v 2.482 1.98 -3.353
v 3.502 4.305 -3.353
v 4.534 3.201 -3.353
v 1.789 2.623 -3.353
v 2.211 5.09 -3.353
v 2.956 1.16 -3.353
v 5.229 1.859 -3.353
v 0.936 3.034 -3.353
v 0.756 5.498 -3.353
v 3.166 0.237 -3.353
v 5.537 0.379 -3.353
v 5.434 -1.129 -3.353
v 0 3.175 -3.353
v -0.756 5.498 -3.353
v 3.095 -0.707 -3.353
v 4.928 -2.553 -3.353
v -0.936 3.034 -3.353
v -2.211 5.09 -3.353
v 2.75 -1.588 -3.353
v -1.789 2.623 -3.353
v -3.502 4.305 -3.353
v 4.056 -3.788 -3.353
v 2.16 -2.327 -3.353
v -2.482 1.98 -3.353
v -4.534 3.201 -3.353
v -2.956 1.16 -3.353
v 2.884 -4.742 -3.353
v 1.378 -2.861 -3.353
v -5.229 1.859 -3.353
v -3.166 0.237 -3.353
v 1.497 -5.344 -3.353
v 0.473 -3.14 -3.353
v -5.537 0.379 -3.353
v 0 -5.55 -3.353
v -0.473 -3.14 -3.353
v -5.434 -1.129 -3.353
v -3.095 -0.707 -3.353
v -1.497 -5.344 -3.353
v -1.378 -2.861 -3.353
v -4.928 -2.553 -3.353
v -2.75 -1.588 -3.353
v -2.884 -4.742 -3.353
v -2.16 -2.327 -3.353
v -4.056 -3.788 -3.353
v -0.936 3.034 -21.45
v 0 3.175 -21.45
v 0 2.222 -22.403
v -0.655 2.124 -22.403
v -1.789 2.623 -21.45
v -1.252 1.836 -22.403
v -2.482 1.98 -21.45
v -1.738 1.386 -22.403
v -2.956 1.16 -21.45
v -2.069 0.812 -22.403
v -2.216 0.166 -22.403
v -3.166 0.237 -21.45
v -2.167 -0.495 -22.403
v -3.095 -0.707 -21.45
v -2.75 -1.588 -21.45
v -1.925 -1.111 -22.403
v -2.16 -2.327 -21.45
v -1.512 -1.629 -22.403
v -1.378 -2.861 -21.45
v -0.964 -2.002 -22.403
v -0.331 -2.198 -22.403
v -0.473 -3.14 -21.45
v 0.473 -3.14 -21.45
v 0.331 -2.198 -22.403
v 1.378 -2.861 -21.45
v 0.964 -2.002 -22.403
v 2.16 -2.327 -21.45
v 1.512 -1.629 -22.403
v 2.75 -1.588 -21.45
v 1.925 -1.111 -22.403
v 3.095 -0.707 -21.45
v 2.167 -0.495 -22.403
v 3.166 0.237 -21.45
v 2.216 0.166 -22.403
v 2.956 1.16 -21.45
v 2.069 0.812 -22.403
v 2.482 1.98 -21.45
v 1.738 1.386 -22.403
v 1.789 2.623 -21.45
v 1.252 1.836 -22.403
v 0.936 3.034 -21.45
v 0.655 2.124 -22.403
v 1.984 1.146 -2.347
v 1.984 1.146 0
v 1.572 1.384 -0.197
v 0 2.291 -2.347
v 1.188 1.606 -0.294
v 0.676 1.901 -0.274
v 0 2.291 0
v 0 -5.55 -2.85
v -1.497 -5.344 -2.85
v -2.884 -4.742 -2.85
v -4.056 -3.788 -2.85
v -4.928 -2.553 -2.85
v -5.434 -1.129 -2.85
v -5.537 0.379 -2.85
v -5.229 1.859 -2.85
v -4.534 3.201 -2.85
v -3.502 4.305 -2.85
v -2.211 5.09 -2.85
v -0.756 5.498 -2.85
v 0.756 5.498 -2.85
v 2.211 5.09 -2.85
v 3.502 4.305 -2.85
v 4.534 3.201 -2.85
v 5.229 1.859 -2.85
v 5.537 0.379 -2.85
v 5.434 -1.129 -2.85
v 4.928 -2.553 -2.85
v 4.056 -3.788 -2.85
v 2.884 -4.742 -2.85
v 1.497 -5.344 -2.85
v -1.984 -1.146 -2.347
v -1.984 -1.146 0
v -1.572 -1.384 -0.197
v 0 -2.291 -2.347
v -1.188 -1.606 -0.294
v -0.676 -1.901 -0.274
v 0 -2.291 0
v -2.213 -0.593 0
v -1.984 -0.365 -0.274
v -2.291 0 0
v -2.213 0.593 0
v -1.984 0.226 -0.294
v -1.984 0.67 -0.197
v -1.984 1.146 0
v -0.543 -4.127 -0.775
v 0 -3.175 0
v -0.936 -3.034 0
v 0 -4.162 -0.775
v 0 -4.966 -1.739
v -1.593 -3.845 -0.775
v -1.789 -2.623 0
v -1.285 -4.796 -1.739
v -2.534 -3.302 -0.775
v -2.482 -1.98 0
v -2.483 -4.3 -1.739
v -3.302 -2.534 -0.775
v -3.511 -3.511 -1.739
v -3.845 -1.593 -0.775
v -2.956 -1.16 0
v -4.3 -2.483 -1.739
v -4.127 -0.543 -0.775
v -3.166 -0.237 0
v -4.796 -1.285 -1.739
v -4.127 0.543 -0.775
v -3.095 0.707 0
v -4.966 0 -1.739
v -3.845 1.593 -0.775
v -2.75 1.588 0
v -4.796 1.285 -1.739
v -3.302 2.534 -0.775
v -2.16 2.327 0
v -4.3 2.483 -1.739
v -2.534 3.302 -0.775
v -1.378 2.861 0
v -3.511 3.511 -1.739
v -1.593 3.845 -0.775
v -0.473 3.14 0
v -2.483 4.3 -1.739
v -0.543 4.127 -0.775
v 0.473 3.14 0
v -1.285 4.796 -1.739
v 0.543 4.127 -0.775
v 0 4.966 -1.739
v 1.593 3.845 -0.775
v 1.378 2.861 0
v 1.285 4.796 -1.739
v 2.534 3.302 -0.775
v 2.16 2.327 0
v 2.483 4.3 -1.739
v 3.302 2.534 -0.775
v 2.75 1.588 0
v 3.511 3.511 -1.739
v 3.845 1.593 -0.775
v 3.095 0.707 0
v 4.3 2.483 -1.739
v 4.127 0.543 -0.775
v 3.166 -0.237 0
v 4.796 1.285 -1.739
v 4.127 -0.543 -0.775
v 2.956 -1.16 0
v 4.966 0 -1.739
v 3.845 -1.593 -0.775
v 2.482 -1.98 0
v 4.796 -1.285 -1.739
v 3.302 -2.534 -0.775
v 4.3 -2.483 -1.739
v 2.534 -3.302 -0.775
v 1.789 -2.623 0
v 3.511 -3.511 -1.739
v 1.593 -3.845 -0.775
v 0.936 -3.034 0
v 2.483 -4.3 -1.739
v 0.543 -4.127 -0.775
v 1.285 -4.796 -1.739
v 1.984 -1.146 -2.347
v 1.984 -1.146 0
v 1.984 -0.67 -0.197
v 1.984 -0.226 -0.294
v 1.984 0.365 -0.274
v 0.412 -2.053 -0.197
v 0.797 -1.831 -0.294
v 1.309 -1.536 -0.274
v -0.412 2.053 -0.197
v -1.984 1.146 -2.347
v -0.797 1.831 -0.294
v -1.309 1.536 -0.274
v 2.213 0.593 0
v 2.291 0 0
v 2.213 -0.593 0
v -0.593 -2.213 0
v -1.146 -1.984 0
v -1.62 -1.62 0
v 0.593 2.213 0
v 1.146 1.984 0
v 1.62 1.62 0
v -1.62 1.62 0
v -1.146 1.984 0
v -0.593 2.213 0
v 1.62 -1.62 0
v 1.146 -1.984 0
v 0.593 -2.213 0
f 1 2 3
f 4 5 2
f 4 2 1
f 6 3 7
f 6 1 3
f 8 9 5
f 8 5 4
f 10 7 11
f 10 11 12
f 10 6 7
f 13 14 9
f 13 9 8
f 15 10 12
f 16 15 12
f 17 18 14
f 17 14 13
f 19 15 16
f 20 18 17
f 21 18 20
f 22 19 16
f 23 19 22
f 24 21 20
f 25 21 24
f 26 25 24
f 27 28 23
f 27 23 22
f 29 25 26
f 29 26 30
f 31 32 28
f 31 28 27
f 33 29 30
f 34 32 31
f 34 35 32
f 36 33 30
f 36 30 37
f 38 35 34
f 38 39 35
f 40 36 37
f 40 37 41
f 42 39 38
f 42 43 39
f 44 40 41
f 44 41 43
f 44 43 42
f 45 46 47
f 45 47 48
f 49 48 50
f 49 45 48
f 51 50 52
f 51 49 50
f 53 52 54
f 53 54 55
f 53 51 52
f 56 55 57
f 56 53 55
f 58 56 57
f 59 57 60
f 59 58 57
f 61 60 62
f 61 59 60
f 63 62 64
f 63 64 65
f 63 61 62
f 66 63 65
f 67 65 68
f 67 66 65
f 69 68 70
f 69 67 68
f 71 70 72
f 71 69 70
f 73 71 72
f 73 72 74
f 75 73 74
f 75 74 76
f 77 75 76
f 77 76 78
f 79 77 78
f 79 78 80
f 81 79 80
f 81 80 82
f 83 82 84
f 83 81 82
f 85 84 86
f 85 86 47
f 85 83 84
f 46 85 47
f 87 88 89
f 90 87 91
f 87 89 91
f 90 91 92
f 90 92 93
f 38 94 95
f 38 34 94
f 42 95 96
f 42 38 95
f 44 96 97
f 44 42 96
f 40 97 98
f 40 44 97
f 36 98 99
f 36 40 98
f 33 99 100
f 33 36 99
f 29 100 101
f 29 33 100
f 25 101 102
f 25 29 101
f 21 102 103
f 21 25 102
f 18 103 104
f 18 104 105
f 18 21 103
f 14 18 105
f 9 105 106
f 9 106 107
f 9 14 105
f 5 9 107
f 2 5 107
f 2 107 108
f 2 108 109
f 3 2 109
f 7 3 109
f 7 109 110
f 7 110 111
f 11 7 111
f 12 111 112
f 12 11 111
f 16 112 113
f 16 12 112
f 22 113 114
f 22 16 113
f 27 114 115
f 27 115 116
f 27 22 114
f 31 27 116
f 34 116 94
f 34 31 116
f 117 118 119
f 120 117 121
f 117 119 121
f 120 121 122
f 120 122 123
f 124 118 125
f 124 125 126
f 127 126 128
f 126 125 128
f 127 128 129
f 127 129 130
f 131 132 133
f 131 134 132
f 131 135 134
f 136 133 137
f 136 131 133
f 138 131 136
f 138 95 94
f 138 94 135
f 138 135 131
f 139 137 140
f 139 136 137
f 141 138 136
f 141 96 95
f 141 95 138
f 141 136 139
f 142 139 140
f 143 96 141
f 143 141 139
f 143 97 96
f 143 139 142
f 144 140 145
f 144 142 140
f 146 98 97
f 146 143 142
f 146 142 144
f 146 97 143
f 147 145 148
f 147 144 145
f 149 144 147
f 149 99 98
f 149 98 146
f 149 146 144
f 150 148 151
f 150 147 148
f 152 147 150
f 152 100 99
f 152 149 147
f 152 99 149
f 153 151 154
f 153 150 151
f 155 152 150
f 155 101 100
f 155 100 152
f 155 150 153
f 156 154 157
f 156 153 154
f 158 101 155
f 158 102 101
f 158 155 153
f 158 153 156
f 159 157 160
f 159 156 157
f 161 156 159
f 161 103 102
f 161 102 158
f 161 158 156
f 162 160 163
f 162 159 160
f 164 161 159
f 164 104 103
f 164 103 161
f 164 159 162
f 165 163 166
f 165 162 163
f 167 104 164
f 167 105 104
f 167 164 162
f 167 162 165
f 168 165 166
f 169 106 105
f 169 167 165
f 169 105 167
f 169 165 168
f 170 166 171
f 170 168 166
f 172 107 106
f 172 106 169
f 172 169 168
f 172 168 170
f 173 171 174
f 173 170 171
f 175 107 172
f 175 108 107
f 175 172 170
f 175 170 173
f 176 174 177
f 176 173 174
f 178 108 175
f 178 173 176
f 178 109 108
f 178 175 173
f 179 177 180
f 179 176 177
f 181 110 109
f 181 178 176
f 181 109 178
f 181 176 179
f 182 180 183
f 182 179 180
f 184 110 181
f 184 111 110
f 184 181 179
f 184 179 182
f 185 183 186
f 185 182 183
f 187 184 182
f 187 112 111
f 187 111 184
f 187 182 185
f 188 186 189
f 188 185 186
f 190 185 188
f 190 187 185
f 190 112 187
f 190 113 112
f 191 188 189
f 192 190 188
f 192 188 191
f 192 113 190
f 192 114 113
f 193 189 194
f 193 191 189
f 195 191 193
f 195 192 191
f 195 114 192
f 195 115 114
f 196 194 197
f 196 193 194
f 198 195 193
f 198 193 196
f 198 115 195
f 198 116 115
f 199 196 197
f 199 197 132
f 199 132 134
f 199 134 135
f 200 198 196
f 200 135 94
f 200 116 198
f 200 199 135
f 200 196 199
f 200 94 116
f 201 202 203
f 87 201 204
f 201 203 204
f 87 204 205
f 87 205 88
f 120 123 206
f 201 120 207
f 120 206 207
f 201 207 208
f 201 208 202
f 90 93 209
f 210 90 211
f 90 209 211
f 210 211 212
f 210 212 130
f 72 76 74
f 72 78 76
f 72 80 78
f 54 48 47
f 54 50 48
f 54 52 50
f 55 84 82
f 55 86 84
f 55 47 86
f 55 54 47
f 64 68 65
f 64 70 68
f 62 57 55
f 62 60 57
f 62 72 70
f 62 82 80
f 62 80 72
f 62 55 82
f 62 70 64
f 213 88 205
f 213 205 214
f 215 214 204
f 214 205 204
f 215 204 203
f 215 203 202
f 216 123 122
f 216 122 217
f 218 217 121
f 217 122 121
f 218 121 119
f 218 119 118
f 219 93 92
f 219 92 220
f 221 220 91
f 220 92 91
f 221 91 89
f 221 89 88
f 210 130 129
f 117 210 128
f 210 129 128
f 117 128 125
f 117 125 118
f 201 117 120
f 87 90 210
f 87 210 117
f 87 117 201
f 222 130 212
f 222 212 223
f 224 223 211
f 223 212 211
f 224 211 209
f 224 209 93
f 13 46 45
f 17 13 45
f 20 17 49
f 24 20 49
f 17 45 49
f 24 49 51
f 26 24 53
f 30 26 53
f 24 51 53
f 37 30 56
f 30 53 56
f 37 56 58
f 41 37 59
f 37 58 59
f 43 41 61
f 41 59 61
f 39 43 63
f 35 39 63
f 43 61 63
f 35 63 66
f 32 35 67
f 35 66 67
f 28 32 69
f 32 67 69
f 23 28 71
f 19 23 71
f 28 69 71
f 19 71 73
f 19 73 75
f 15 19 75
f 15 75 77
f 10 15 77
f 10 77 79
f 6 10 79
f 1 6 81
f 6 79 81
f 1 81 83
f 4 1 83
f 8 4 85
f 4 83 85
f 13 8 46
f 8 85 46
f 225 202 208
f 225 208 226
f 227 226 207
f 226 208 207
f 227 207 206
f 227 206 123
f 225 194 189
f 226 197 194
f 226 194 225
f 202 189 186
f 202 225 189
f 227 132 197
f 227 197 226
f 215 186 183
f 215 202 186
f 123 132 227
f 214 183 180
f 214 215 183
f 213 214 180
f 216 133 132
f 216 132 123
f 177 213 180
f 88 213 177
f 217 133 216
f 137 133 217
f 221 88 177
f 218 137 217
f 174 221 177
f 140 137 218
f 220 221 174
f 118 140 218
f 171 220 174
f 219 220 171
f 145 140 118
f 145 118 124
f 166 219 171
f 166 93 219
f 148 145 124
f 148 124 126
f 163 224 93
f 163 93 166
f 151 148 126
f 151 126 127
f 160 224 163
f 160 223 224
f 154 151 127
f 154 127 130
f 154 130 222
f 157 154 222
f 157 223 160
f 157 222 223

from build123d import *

# Parameters (mm, degrees)
SKETCH1_W          = 19.05
SKETCH1_H          = 3.175
CHAMFER1_SIZE      = 0.9525
CUT_EXTRUDE2_DEPTH = 2.34696


with BuildPart() as part:
    # Sketch1 → Revolve1 (revolve)
    with BuildSketch(Plane(origin=(0, 0, 0), x_dir=(0, 0, -1), z_dir=(1, 0, 0))):
        with Locations((12.8778, 1.5875)):
            Rectangle(SKETCH1_W, SKETCH1_H)
    revolve(axis=Axis((0, 0, -22.4028), (0, 0, 1)))

    # Chamfer1
    chamfer1_edges = [part.edges().sort_by_distance(p)[0] for p in [
        (0, -3.175, -22.4028),
    ]]
    chamfer(chamfer1_edges, length=CHAMFER1_SIZE)

    # Sketch7 → Revolve2 (revolve)
    with BuildSketch(Plane(origin=(0, 0, 0), x_dir=(0, 0, -1), z_dir=(1, 0, 0))):
        with BuildLine():
            Line((2.84988, 5.5499), (3.3528, 5.5499))
            Line((3.3528, 5.5499), (3.3528, 0))
            Line((3.3528, 0), (0, 0))
            Line((0, 0), (0, 3.175))
            ThreePointArc((0, 3.175), (1.235921075, 4.58927271), (2.84988, 5.5499))
        make_face()
    revolve(axis=Axis((0, 0, 0), (0, 0, -1)))

    # Sketch5 → Cut-Extrude2 (cut)
    with BuildSketch(Plane.XY):
        Polygon((1.984375, -1.14567944), (1.984375, 1.14567944), (0, 2.291358881), (-1.984375, 1.14567944), (-1.984375, -1.14567944), (0, -2.291358881), align=None)
    extrude(amount=-CUT_EXTRUDE2_DEPTH, mode=Mode.SUBTRACT)

    # Cut-Extrude3 cone 1 section (through the dimple's axis) → Cut-Extrude3 (revolve, cut)
    with BuildSketch(Plane(origin=(0, 0, 0), x_dir=(0, -1, 0), z_dir=(1, 0, 0))):
        Polygon((0, 0), (2.291358881, 0), (0, 2.291358881), align=None)
    revolve(axis=Axis((0, 0, 0), (0, 0, -1)), mode=Mode.SUBTRACT)


solid = part.part
